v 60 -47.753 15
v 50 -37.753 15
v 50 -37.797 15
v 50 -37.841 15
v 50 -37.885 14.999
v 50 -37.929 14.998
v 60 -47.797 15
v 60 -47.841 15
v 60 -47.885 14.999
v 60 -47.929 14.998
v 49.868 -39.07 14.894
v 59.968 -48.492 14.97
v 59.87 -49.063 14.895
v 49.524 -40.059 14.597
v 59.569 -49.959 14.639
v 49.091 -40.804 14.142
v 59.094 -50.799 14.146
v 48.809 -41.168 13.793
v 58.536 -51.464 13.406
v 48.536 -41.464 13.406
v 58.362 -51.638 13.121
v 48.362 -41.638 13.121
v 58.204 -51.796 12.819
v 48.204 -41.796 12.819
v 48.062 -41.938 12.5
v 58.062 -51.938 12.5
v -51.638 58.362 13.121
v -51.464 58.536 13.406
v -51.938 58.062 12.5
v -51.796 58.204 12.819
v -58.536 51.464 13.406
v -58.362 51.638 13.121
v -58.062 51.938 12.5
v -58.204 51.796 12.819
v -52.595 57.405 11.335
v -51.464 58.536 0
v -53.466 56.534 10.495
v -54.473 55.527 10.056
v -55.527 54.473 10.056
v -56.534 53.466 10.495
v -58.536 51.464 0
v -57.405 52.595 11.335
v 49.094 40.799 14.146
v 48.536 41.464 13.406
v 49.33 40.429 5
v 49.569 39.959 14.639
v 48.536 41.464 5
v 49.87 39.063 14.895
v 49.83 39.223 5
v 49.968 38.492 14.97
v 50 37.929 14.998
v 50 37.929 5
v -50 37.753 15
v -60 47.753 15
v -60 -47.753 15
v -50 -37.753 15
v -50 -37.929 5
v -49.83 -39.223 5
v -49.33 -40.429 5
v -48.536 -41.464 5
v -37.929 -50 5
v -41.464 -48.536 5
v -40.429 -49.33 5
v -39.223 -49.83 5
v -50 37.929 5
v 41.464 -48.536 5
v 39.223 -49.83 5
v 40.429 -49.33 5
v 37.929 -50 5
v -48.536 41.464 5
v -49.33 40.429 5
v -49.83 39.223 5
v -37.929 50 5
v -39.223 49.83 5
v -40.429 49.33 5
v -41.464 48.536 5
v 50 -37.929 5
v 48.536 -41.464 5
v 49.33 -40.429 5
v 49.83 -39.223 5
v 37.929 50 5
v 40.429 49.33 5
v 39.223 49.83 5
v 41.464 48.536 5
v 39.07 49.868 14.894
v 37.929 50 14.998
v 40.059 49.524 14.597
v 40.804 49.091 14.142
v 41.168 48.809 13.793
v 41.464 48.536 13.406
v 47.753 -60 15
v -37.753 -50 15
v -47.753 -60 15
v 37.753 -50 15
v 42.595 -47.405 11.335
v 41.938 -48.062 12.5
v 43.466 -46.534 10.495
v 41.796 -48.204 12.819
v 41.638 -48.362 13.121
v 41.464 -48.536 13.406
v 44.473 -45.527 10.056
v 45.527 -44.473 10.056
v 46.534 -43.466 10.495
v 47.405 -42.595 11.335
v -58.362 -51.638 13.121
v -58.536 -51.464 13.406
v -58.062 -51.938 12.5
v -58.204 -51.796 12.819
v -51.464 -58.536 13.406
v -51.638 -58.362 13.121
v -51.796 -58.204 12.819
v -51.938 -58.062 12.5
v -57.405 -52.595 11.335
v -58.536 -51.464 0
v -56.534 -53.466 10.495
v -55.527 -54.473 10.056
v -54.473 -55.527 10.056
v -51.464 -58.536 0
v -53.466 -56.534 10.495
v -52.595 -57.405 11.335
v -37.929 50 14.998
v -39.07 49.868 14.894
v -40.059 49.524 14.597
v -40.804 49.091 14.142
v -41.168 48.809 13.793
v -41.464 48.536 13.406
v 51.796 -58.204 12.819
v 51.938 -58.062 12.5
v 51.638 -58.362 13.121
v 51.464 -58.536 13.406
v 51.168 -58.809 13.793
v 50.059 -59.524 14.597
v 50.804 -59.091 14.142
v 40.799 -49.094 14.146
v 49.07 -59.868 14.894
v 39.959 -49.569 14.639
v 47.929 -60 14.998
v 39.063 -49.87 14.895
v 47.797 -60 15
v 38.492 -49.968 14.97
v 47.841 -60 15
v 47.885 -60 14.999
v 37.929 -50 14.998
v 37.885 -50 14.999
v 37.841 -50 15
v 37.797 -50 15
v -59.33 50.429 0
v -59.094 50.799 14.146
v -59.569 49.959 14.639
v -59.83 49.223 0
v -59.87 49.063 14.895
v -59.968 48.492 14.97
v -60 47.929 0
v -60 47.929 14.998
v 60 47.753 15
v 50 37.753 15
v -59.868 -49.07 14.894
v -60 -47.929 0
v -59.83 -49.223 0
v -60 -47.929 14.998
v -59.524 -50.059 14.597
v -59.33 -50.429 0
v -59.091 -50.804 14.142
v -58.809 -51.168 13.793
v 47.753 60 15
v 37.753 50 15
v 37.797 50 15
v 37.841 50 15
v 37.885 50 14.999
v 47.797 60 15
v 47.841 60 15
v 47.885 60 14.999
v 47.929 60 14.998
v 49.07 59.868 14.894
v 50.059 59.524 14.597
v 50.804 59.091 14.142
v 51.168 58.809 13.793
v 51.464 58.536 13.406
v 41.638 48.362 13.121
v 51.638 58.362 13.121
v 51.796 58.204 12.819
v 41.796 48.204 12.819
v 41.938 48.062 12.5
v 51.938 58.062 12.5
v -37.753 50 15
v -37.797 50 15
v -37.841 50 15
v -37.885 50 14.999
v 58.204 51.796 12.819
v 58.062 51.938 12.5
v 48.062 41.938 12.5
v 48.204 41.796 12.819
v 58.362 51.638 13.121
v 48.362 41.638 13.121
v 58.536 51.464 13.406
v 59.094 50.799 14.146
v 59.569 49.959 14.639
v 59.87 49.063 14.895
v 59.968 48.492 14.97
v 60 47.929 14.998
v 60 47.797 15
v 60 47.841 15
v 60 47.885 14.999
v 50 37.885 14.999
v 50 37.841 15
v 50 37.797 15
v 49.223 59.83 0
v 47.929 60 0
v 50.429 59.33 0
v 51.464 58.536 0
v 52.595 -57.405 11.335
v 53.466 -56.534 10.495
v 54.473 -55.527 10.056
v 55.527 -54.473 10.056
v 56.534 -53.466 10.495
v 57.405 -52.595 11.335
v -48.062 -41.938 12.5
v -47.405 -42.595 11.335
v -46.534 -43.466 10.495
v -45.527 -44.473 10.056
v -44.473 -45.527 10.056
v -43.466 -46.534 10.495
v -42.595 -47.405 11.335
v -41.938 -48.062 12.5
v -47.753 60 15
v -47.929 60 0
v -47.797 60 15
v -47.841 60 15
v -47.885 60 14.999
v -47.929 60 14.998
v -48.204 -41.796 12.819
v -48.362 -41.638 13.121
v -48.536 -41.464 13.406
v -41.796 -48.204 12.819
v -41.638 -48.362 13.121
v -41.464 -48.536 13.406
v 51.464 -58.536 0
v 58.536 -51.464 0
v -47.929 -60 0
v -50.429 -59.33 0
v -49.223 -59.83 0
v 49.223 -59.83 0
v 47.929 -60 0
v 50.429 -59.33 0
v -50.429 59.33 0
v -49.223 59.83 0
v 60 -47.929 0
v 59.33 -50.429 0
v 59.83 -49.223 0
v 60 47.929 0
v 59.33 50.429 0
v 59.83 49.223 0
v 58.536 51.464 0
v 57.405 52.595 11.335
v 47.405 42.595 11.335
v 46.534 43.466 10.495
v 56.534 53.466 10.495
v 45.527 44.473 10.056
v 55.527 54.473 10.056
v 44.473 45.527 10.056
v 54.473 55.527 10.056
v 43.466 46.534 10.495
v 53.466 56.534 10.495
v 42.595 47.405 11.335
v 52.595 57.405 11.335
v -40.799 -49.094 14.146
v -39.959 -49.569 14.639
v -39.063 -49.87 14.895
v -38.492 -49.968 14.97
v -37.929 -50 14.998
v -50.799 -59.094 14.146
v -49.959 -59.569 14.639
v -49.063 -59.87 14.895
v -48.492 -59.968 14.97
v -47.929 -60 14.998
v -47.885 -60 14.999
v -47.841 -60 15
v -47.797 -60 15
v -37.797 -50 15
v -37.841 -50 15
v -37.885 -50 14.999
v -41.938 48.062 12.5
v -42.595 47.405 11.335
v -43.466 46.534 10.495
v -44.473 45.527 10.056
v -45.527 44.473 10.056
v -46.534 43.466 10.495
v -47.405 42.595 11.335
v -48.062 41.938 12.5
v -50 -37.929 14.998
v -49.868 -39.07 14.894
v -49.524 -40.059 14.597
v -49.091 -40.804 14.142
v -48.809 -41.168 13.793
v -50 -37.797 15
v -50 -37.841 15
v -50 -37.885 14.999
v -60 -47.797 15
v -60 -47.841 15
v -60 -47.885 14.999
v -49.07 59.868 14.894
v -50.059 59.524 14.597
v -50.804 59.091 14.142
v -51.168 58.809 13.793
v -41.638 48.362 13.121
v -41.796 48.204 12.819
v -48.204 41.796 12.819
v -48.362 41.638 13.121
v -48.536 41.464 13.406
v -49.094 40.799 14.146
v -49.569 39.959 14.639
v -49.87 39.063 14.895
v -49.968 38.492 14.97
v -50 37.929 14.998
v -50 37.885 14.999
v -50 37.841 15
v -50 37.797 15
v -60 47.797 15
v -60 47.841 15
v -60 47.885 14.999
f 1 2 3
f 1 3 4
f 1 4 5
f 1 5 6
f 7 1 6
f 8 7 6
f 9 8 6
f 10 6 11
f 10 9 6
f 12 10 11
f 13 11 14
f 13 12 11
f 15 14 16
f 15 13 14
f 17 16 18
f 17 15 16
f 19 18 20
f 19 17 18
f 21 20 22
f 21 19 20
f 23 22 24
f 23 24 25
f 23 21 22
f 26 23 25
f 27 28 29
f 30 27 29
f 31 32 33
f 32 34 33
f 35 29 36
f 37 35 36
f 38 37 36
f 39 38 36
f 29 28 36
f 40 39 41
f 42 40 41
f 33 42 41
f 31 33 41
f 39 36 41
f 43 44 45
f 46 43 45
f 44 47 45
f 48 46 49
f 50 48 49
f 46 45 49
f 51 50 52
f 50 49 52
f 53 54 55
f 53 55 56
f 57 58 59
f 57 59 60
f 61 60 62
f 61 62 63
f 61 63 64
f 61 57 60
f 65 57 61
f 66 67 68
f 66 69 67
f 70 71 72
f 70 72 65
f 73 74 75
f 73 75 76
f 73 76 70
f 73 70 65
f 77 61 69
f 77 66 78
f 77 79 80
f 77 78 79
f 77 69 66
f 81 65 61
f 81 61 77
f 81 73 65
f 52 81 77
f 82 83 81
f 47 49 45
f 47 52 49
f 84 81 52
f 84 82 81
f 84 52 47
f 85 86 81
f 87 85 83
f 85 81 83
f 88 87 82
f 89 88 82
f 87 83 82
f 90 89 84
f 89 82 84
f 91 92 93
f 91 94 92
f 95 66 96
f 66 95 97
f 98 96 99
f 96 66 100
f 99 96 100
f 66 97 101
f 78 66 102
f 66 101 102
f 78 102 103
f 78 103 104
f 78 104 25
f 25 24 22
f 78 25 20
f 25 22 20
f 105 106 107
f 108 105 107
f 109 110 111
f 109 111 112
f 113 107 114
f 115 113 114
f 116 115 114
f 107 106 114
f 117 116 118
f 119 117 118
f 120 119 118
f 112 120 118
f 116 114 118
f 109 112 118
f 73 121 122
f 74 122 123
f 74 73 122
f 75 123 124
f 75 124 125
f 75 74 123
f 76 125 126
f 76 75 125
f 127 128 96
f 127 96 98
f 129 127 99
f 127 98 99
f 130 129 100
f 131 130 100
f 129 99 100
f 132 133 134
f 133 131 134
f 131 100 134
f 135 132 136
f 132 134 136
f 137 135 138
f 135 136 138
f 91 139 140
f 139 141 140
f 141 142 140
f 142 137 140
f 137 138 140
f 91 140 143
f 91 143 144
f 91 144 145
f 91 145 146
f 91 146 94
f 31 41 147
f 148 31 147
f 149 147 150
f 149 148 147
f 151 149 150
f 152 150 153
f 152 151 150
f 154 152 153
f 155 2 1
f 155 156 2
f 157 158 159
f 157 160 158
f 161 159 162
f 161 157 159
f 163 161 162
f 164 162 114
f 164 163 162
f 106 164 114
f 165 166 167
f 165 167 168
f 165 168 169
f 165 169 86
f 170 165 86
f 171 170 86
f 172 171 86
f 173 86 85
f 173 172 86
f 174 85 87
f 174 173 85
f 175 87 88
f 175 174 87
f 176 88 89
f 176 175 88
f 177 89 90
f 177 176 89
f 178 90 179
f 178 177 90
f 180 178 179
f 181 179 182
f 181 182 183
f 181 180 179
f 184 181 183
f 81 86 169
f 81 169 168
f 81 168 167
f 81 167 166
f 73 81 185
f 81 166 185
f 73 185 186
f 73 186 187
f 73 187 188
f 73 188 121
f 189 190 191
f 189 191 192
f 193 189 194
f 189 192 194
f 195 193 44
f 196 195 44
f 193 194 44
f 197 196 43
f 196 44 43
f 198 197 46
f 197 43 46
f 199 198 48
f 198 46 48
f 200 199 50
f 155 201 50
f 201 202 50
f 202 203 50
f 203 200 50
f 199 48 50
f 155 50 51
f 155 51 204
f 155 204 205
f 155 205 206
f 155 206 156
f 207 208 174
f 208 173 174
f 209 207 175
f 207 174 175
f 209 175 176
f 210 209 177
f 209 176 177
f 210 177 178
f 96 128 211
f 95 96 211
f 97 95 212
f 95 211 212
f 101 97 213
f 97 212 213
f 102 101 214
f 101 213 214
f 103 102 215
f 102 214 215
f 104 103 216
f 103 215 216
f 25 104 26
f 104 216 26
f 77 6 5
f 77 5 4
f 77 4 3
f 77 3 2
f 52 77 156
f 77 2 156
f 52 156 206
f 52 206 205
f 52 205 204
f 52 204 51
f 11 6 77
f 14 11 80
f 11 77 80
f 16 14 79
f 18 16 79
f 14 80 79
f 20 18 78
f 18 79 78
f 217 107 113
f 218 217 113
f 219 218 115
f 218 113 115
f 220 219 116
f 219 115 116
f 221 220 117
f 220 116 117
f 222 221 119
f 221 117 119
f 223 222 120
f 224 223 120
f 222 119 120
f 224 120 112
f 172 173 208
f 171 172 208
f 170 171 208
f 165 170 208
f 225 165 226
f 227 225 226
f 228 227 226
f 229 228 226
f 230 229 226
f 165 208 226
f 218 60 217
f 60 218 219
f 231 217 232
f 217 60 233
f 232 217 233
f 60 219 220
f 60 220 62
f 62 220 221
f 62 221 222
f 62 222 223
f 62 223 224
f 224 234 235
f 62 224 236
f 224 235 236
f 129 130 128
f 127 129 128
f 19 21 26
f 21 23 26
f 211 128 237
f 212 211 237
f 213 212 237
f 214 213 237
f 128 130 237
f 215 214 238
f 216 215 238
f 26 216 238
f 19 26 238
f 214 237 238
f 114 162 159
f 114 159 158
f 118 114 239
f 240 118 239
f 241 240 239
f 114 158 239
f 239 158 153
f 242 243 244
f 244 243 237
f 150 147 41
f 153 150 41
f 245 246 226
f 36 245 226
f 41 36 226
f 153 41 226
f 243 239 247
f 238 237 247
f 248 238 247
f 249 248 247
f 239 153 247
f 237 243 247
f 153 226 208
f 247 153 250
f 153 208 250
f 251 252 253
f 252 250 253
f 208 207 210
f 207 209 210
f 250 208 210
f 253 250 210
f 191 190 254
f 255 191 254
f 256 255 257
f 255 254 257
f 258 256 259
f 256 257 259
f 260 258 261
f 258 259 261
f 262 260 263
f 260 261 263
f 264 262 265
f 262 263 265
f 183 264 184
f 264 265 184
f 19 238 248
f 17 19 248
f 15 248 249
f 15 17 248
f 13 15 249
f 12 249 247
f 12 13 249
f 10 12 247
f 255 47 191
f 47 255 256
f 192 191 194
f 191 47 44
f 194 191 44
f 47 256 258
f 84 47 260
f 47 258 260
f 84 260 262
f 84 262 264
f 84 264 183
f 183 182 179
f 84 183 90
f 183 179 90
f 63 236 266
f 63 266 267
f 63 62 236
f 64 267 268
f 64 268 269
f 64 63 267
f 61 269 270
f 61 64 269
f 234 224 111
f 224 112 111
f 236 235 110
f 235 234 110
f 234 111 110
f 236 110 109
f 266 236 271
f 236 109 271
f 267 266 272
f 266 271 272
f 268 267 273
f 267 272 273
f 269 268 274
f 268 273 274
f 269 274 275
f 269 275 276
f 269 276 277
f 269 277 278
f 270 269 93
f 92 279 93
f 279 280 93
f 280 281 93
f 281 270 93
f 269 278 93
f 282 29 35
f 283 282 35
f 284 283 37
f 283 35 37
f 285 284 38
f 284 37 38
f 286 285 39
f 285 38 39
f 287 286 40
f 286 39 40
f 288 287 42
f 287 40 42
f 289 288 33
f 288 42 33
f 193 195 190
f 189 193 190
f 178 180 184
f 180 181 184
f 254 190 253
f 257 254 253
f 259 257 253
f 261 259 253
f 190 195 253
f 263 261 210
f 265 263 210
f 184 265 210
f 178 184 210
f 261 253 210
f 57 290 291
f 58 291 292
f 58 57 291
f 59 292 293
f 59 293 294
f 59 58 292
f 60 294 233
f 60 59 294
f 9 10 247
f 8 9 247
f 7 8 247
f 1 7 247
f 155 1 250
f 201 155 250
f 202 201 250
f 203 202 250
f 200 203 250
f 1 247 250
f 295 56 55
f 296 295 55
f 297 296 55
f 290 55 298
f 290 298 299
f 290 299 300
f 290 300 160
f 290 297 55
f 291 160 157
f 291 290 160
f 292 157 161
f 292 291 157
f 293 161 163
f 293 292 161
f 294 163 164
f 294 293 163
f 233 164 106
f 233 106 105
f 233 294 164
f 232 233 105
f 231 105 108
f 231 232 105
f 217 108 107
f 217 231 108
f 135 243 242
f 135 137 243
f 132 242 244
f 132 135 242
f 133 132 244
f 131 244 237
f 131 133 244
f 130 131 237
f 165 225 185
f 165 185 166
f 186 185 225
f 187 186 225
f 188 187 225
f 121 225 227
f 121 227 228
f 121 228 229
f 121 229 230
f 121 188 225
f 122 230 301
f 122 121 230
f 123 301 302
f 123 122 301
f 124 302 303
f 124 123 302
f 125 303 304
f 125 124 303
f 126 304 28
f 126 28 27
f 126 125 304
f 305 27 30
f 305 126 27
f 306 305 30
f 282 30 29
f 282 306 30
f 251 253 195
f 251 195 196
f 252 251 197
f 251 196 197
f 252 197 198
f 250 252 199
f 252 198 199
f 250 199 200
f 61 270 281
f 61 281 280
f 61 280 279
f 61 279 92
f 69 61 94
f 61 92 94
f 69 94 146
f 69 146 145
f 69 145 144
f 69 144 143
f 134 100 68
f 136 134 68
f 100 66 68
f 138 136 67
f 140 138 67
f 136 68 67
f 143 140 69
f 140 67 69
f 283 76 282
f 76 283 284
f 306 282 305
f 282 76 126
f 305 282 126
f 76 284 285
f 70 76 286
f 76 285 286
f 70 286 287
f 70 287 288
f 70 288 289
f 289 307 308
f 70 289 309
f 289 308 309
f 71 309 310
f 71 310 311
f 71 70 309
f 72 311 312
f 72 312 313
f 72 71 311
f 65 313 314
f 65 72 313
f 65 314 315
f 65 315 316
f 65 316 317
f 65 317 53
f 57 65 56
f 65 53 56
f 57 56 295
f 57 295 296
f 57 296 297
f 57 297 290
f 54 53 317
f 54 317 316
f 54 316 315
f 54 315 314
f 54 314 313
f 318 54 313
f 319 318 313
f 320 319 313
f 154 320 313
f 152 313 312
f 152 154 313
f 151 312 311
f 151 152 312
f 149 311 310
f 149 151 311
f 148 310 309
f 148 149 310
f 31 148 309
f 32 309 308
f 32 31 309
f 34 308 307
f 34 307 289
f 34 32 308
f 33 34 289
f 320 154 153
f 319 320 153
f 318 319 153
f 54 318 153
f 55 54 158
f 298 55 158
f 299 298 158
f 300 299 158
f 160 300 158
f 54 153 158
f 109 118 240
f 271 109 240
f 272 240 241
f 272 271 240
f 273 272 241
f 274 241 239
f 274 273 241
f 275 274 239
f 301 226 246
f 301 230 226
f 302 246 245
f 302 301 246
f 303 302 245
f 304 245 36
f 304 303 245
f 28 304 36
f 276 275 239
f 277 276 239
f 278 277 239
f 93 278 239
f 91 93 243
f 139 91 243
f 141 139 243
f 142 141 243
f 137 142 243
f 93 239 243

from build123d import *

# Parameters (mm, degrees)
F1_DEPTH      = 15
F3_DEPTH      = 10
F5_R          = 5
F6_DEPTH      = 15
F8_R          = 5
F9_DEPTH      = 15
F11_R         = 5
F12_DEPTH     = 15
F14_R         = 5
F15_DEPTH     = 15
F16_T1_DEPTH  = 32.443405813
F16_T3_DEPTH  = 32.443405813
F16_T5_DEPTH  = 32.443405813
F16_T7_DEPTH  = 32.443405813
F16_T9_DEPTH  = 32.443405813
F16_T11_DEPTH = 32.443405813
F16_T13_DEPTH = 32.443405813
F16_T15_DEPTH = 32.443405813
F17_R         = 5
F18_R         = 5


# Not quite as in the source:
# - a fillet or chamfer that OpenCascade refuses, or shapes differently, is made with other operations: its cross-section is extruded or revolved along the edge and cut away or added


with BuildPart() as f1:
    # F0 (on Top) → F1 (new body)
    with BuildSketch(Plane.XY):
        Polygon((50, 60), (-50, 60), (-60, 50), (-60, -50), (-50, -60), (50, -60), (60, -50), (60, 50), align=None)
    extrude(amount=F1_DEPTH)

    # F2 (on face) → F3 (cut)
    with BuildSketch(Plane.XY.offset(15)):
        Polygon((40, 50), (-40, 50), (-50, 40), (-50, -40), (-40, -50), (40, -50), (50, -40), (50, 40), align=None)
    extrude(amount=-F3_DEPTH, mode=Mode.SUBTRACT)

    # F5 (on offset) → F6 (cut)
    with BuildSketch(Plane(origin=(-55.0707106781, 55.0707106781, 0), x_dir=(-0.7071067812, -0.7071067812, 0), z_dir=(-0.7071067812, 0.7071067812, 0))):
        with Locations((0, 15)):
            Circle(F5_R)
    extrude(amount=-F6_DEPTH, mode=Mode.SUBTRACT)

    # F8 (on offset) → F9 (cut)
    with BuildSketch(Plane(origin=(55.0707106781, 55.0707106781, 0), x_dir=(-0.7071067812, 0.7071067812, 0), z_dir=(0.7071067812, 0.7071067812, 0))):
        with Locations((0, 15)):
            Circle(F8_R)
    extrude(amount=-F9_DEPTH, mode=Mode.SUBTRACT)

    # F11 (on offset) → F12 (cut)
    with BuildSketch(Plane(origin=(55.0707106781, -55.0707106781, 0), x_dir=(0.7071067812, 0.7071067812, 0), z_dir=(0.7071067812, -0.7071067812, 0))):
        with Locations((0, 15)):
            Circle(F11_R)
    extrude(amount=-F12_DEPTH, mode=Mode.SUBTRACT)

    # F14 (on offset) → F15 (cut)
    with BuildSketch(Plane(origin=(-55.0707106781, -55.0707106781, 0), x_dir=(0.7071067812, -0.7071067812, 0), z_dir=(-0.7071067812, -0.7071067812, 0))):
        with Locations((0, 15)):
            Circle(F14_R)
    extrude(amount=-F15_DEPTH, mode=Mode.SUBTRACT)

    # F16: fillet of radius 5 on 8 edges, made by hand

    # F16_s2 → F16_t1 (cut)
    with BuildSketch(Plane(origin=(-61.4704761276, 61.4704761276, 0), x_dir=(0, 0, 1), z_dir=(0.7071067812, -0.7071067812, 0))):
        with BuildLine():
            ThreePointArc((15, 8.6602540378), (14.3301270189, 6.1602540378), (12.5, 4.3301270189))
            ThreePointArc((12.5, 4.3301270189), (13.7059047745, 4.8296291314), (15, 5))
            Line((15, 5), (15, 8.6602540378))
        make_face()
    extrude(amount=F16_T1_DEPTH, mode=Mode.SUBTRACT)

    # F16_s4 → F16_t3 (cut)
    with BuildSketch(Plane(origin=(-38.5295238724, 38.5295238724, 0), x_dir=(0, 0, 1), z_dir=(-0.7071067812, 0.7071067812, 0))):
        with BuildLine():
            ThreePointArc((15, 8.6602540378), (14.3301270189, 6.1602540378), (12.5, 4.3301270189))
            ThreePointArc((12.5, 4.3301270189), (13.7059047745, 4.8296291314), (15, 5))
            Line((15, 5), (15, 8.6602540378))
        make_face()
    extrude(amount=F16_T3_DEPTH, mode=Mode.SUBTRACT)

    # F16_s6 → F16_t5 (cut)
    with BuildSketch(Plane(origin=(-38.5295238724, -38.5295238724, 0), x_dir=(0, 0, 1), z_dir=(-0.7071067812, -0.7071067812, 0))):
        with BuildLine():
            ThreePointArc((15, 8.6602540378), (14.3301270189, 6.1602540378), (12.5, 4.3301270189))
            ThreePointArc((12.5, 4.3301270189), (13.7059047745, 4.8296291314), (15, 5))
            Line((15, 5), (15, 8.6602540378))
        make_face()
    extrude(amount=F16_T5_DEPTH, mode=Mode.SUBTRACT)

    # F16_s8 → F16_t7 (cut)
    with BuildSketch(Plane(origin=(-61.4704761276, -61.4704761276, 0), x_dir=(0, 0, 1), z_dir=(0.7071067812, 0.7071067812, 0))):
        with BuildLine():
            ThreePointArc((12.5, 4.3301270189), (14.3301270189, 6.1602540378), (15, 8.6602540378))
            Line((15, 8.6602540378), (15, 5))
            ThreePointArc((15, 5), (13.7059047745, 4.8296291314), (12.5, 4.3301270189))
        make_face()
    extrude(amount=F16_T7_DEPTH, mode=Mode.SUBTRACT)

    # F16_s10 → F16_t9 (cut)
    with BuildSketch(Plane(origin=(61.4704761276, -61.4704761276, 0), x_dir=(0, 0, 1), z_dir=(-0.7071067812, 0.7071067812, 0))):
        with BuildLine():
            ThreePointArc((15, 8.6602540378), (14.3301270189, 6.1602540378), (12.5, 4.3301270189))
            ThreePointArc((12.5, 4.3301270189), (13.7059047745, 4.8296291314), (15, 5))
            Line((15, 5), (15, 8.6602540378))
        make_face()
    extrude(amount=F16_T9_DEPTH, mode=Mode.SUBTRACT)

    # F16_s12 → F16_t11 (cut)
    with BuildSketch(Plane(origin=(38.5295238724, -38.5295238724, 0), x_dir=(0, 0, 1), z_dir=(0.7071067812, -0.7071067812, 0))):
        with BuildLine():
            ThreePointArc((12.5, 4.3301270189), (14.3301270189, 6.1602540378), (15, 8.6602540378))
            Line((15, 8.6602540378), (15, 5))
            ThreePointArc((15, 5), (13.7059047745, 4.8296291314), (12.5, 4.3301270189))
        make_face()
    extrude(amount=F16_T11_DEPTH, mode=Mode.SUBTRACT)

    # F16_s14 → F16_t13 (cut)
    with BuildSketch(Plane(origin=(61.4704761276, 61.4704761276, 0), x_dir=(0, 0, 1), z_dir=(-0.7071067812, -0.7071067812, 0))):
        with BuildLine():
            ThreePointArc((15, 8.6602540378), (14.3301270189, 6.1602540378), (12.5, 4.3301270189))
            ThreePointArc((12.5, 4.3301270189), (13.7059047745, 4.8296291314), (15, 5))
            Line((15, 5), (15, 8.6602540378))
        make_face()
    extrude(amount=F16_T13_DEPTH, mode=Mode.SUBTRACT)

    # F16_s16 → F16_t15 (cut)
    with BuildSketch(Plane(origin=(38.5295238724, 38.5295238724, 0), x_dir=(0, 0, 1), z_dir=(0.7071067812, 0.7071067812, 0))):
        with BuildLine():
            ThreePointArc((12.5, 4.3301270189), (14.3301270189, 6.1602540378), (15, 8.6602540378))
            Line((15, 8.6602540378), (15, 5))
            ThreePointArc((15, 5), (13.7059047745, 4.8296291314), (12.5, 4.3301270189))
        make_face()
    extrude(amount=F16_T15_DEPTH, mode=Mode.SUBTRACT)

    # F17
    f17_edges = [f1.edges().sort_by_distance(p)[0] for p in [
        (-60, 50, 7.370363),
        (-50, 60, 7.370363),
        (-60, -50, 7.370363),
        (-50, -60, 7.370363),
        (50, -60, 7.370363),
        (60, -50, 7.370363),
        (60, 50, 7.370363),
        (50, 60, 7.370363),
    ]]
    fillet(f17_edges, radius=F17_R)

    # F18
    f18_edges = [f1.edges().sort_by_distance(p)[0] for p in [
        (-40, -50, 9.870363),
        (-50, -40, 9.870363),
        (-50, 40, 9.870363),
        (-40, 50, 9.870363),
        (40, 50, 9.870363),
        (50, 40, 9.870363),
        (50, -40, 9.870363),
        (40, -50, 9.870363),
    ]]
    fillet(f18_edges, radius=F18_R)


solid = f1.part
